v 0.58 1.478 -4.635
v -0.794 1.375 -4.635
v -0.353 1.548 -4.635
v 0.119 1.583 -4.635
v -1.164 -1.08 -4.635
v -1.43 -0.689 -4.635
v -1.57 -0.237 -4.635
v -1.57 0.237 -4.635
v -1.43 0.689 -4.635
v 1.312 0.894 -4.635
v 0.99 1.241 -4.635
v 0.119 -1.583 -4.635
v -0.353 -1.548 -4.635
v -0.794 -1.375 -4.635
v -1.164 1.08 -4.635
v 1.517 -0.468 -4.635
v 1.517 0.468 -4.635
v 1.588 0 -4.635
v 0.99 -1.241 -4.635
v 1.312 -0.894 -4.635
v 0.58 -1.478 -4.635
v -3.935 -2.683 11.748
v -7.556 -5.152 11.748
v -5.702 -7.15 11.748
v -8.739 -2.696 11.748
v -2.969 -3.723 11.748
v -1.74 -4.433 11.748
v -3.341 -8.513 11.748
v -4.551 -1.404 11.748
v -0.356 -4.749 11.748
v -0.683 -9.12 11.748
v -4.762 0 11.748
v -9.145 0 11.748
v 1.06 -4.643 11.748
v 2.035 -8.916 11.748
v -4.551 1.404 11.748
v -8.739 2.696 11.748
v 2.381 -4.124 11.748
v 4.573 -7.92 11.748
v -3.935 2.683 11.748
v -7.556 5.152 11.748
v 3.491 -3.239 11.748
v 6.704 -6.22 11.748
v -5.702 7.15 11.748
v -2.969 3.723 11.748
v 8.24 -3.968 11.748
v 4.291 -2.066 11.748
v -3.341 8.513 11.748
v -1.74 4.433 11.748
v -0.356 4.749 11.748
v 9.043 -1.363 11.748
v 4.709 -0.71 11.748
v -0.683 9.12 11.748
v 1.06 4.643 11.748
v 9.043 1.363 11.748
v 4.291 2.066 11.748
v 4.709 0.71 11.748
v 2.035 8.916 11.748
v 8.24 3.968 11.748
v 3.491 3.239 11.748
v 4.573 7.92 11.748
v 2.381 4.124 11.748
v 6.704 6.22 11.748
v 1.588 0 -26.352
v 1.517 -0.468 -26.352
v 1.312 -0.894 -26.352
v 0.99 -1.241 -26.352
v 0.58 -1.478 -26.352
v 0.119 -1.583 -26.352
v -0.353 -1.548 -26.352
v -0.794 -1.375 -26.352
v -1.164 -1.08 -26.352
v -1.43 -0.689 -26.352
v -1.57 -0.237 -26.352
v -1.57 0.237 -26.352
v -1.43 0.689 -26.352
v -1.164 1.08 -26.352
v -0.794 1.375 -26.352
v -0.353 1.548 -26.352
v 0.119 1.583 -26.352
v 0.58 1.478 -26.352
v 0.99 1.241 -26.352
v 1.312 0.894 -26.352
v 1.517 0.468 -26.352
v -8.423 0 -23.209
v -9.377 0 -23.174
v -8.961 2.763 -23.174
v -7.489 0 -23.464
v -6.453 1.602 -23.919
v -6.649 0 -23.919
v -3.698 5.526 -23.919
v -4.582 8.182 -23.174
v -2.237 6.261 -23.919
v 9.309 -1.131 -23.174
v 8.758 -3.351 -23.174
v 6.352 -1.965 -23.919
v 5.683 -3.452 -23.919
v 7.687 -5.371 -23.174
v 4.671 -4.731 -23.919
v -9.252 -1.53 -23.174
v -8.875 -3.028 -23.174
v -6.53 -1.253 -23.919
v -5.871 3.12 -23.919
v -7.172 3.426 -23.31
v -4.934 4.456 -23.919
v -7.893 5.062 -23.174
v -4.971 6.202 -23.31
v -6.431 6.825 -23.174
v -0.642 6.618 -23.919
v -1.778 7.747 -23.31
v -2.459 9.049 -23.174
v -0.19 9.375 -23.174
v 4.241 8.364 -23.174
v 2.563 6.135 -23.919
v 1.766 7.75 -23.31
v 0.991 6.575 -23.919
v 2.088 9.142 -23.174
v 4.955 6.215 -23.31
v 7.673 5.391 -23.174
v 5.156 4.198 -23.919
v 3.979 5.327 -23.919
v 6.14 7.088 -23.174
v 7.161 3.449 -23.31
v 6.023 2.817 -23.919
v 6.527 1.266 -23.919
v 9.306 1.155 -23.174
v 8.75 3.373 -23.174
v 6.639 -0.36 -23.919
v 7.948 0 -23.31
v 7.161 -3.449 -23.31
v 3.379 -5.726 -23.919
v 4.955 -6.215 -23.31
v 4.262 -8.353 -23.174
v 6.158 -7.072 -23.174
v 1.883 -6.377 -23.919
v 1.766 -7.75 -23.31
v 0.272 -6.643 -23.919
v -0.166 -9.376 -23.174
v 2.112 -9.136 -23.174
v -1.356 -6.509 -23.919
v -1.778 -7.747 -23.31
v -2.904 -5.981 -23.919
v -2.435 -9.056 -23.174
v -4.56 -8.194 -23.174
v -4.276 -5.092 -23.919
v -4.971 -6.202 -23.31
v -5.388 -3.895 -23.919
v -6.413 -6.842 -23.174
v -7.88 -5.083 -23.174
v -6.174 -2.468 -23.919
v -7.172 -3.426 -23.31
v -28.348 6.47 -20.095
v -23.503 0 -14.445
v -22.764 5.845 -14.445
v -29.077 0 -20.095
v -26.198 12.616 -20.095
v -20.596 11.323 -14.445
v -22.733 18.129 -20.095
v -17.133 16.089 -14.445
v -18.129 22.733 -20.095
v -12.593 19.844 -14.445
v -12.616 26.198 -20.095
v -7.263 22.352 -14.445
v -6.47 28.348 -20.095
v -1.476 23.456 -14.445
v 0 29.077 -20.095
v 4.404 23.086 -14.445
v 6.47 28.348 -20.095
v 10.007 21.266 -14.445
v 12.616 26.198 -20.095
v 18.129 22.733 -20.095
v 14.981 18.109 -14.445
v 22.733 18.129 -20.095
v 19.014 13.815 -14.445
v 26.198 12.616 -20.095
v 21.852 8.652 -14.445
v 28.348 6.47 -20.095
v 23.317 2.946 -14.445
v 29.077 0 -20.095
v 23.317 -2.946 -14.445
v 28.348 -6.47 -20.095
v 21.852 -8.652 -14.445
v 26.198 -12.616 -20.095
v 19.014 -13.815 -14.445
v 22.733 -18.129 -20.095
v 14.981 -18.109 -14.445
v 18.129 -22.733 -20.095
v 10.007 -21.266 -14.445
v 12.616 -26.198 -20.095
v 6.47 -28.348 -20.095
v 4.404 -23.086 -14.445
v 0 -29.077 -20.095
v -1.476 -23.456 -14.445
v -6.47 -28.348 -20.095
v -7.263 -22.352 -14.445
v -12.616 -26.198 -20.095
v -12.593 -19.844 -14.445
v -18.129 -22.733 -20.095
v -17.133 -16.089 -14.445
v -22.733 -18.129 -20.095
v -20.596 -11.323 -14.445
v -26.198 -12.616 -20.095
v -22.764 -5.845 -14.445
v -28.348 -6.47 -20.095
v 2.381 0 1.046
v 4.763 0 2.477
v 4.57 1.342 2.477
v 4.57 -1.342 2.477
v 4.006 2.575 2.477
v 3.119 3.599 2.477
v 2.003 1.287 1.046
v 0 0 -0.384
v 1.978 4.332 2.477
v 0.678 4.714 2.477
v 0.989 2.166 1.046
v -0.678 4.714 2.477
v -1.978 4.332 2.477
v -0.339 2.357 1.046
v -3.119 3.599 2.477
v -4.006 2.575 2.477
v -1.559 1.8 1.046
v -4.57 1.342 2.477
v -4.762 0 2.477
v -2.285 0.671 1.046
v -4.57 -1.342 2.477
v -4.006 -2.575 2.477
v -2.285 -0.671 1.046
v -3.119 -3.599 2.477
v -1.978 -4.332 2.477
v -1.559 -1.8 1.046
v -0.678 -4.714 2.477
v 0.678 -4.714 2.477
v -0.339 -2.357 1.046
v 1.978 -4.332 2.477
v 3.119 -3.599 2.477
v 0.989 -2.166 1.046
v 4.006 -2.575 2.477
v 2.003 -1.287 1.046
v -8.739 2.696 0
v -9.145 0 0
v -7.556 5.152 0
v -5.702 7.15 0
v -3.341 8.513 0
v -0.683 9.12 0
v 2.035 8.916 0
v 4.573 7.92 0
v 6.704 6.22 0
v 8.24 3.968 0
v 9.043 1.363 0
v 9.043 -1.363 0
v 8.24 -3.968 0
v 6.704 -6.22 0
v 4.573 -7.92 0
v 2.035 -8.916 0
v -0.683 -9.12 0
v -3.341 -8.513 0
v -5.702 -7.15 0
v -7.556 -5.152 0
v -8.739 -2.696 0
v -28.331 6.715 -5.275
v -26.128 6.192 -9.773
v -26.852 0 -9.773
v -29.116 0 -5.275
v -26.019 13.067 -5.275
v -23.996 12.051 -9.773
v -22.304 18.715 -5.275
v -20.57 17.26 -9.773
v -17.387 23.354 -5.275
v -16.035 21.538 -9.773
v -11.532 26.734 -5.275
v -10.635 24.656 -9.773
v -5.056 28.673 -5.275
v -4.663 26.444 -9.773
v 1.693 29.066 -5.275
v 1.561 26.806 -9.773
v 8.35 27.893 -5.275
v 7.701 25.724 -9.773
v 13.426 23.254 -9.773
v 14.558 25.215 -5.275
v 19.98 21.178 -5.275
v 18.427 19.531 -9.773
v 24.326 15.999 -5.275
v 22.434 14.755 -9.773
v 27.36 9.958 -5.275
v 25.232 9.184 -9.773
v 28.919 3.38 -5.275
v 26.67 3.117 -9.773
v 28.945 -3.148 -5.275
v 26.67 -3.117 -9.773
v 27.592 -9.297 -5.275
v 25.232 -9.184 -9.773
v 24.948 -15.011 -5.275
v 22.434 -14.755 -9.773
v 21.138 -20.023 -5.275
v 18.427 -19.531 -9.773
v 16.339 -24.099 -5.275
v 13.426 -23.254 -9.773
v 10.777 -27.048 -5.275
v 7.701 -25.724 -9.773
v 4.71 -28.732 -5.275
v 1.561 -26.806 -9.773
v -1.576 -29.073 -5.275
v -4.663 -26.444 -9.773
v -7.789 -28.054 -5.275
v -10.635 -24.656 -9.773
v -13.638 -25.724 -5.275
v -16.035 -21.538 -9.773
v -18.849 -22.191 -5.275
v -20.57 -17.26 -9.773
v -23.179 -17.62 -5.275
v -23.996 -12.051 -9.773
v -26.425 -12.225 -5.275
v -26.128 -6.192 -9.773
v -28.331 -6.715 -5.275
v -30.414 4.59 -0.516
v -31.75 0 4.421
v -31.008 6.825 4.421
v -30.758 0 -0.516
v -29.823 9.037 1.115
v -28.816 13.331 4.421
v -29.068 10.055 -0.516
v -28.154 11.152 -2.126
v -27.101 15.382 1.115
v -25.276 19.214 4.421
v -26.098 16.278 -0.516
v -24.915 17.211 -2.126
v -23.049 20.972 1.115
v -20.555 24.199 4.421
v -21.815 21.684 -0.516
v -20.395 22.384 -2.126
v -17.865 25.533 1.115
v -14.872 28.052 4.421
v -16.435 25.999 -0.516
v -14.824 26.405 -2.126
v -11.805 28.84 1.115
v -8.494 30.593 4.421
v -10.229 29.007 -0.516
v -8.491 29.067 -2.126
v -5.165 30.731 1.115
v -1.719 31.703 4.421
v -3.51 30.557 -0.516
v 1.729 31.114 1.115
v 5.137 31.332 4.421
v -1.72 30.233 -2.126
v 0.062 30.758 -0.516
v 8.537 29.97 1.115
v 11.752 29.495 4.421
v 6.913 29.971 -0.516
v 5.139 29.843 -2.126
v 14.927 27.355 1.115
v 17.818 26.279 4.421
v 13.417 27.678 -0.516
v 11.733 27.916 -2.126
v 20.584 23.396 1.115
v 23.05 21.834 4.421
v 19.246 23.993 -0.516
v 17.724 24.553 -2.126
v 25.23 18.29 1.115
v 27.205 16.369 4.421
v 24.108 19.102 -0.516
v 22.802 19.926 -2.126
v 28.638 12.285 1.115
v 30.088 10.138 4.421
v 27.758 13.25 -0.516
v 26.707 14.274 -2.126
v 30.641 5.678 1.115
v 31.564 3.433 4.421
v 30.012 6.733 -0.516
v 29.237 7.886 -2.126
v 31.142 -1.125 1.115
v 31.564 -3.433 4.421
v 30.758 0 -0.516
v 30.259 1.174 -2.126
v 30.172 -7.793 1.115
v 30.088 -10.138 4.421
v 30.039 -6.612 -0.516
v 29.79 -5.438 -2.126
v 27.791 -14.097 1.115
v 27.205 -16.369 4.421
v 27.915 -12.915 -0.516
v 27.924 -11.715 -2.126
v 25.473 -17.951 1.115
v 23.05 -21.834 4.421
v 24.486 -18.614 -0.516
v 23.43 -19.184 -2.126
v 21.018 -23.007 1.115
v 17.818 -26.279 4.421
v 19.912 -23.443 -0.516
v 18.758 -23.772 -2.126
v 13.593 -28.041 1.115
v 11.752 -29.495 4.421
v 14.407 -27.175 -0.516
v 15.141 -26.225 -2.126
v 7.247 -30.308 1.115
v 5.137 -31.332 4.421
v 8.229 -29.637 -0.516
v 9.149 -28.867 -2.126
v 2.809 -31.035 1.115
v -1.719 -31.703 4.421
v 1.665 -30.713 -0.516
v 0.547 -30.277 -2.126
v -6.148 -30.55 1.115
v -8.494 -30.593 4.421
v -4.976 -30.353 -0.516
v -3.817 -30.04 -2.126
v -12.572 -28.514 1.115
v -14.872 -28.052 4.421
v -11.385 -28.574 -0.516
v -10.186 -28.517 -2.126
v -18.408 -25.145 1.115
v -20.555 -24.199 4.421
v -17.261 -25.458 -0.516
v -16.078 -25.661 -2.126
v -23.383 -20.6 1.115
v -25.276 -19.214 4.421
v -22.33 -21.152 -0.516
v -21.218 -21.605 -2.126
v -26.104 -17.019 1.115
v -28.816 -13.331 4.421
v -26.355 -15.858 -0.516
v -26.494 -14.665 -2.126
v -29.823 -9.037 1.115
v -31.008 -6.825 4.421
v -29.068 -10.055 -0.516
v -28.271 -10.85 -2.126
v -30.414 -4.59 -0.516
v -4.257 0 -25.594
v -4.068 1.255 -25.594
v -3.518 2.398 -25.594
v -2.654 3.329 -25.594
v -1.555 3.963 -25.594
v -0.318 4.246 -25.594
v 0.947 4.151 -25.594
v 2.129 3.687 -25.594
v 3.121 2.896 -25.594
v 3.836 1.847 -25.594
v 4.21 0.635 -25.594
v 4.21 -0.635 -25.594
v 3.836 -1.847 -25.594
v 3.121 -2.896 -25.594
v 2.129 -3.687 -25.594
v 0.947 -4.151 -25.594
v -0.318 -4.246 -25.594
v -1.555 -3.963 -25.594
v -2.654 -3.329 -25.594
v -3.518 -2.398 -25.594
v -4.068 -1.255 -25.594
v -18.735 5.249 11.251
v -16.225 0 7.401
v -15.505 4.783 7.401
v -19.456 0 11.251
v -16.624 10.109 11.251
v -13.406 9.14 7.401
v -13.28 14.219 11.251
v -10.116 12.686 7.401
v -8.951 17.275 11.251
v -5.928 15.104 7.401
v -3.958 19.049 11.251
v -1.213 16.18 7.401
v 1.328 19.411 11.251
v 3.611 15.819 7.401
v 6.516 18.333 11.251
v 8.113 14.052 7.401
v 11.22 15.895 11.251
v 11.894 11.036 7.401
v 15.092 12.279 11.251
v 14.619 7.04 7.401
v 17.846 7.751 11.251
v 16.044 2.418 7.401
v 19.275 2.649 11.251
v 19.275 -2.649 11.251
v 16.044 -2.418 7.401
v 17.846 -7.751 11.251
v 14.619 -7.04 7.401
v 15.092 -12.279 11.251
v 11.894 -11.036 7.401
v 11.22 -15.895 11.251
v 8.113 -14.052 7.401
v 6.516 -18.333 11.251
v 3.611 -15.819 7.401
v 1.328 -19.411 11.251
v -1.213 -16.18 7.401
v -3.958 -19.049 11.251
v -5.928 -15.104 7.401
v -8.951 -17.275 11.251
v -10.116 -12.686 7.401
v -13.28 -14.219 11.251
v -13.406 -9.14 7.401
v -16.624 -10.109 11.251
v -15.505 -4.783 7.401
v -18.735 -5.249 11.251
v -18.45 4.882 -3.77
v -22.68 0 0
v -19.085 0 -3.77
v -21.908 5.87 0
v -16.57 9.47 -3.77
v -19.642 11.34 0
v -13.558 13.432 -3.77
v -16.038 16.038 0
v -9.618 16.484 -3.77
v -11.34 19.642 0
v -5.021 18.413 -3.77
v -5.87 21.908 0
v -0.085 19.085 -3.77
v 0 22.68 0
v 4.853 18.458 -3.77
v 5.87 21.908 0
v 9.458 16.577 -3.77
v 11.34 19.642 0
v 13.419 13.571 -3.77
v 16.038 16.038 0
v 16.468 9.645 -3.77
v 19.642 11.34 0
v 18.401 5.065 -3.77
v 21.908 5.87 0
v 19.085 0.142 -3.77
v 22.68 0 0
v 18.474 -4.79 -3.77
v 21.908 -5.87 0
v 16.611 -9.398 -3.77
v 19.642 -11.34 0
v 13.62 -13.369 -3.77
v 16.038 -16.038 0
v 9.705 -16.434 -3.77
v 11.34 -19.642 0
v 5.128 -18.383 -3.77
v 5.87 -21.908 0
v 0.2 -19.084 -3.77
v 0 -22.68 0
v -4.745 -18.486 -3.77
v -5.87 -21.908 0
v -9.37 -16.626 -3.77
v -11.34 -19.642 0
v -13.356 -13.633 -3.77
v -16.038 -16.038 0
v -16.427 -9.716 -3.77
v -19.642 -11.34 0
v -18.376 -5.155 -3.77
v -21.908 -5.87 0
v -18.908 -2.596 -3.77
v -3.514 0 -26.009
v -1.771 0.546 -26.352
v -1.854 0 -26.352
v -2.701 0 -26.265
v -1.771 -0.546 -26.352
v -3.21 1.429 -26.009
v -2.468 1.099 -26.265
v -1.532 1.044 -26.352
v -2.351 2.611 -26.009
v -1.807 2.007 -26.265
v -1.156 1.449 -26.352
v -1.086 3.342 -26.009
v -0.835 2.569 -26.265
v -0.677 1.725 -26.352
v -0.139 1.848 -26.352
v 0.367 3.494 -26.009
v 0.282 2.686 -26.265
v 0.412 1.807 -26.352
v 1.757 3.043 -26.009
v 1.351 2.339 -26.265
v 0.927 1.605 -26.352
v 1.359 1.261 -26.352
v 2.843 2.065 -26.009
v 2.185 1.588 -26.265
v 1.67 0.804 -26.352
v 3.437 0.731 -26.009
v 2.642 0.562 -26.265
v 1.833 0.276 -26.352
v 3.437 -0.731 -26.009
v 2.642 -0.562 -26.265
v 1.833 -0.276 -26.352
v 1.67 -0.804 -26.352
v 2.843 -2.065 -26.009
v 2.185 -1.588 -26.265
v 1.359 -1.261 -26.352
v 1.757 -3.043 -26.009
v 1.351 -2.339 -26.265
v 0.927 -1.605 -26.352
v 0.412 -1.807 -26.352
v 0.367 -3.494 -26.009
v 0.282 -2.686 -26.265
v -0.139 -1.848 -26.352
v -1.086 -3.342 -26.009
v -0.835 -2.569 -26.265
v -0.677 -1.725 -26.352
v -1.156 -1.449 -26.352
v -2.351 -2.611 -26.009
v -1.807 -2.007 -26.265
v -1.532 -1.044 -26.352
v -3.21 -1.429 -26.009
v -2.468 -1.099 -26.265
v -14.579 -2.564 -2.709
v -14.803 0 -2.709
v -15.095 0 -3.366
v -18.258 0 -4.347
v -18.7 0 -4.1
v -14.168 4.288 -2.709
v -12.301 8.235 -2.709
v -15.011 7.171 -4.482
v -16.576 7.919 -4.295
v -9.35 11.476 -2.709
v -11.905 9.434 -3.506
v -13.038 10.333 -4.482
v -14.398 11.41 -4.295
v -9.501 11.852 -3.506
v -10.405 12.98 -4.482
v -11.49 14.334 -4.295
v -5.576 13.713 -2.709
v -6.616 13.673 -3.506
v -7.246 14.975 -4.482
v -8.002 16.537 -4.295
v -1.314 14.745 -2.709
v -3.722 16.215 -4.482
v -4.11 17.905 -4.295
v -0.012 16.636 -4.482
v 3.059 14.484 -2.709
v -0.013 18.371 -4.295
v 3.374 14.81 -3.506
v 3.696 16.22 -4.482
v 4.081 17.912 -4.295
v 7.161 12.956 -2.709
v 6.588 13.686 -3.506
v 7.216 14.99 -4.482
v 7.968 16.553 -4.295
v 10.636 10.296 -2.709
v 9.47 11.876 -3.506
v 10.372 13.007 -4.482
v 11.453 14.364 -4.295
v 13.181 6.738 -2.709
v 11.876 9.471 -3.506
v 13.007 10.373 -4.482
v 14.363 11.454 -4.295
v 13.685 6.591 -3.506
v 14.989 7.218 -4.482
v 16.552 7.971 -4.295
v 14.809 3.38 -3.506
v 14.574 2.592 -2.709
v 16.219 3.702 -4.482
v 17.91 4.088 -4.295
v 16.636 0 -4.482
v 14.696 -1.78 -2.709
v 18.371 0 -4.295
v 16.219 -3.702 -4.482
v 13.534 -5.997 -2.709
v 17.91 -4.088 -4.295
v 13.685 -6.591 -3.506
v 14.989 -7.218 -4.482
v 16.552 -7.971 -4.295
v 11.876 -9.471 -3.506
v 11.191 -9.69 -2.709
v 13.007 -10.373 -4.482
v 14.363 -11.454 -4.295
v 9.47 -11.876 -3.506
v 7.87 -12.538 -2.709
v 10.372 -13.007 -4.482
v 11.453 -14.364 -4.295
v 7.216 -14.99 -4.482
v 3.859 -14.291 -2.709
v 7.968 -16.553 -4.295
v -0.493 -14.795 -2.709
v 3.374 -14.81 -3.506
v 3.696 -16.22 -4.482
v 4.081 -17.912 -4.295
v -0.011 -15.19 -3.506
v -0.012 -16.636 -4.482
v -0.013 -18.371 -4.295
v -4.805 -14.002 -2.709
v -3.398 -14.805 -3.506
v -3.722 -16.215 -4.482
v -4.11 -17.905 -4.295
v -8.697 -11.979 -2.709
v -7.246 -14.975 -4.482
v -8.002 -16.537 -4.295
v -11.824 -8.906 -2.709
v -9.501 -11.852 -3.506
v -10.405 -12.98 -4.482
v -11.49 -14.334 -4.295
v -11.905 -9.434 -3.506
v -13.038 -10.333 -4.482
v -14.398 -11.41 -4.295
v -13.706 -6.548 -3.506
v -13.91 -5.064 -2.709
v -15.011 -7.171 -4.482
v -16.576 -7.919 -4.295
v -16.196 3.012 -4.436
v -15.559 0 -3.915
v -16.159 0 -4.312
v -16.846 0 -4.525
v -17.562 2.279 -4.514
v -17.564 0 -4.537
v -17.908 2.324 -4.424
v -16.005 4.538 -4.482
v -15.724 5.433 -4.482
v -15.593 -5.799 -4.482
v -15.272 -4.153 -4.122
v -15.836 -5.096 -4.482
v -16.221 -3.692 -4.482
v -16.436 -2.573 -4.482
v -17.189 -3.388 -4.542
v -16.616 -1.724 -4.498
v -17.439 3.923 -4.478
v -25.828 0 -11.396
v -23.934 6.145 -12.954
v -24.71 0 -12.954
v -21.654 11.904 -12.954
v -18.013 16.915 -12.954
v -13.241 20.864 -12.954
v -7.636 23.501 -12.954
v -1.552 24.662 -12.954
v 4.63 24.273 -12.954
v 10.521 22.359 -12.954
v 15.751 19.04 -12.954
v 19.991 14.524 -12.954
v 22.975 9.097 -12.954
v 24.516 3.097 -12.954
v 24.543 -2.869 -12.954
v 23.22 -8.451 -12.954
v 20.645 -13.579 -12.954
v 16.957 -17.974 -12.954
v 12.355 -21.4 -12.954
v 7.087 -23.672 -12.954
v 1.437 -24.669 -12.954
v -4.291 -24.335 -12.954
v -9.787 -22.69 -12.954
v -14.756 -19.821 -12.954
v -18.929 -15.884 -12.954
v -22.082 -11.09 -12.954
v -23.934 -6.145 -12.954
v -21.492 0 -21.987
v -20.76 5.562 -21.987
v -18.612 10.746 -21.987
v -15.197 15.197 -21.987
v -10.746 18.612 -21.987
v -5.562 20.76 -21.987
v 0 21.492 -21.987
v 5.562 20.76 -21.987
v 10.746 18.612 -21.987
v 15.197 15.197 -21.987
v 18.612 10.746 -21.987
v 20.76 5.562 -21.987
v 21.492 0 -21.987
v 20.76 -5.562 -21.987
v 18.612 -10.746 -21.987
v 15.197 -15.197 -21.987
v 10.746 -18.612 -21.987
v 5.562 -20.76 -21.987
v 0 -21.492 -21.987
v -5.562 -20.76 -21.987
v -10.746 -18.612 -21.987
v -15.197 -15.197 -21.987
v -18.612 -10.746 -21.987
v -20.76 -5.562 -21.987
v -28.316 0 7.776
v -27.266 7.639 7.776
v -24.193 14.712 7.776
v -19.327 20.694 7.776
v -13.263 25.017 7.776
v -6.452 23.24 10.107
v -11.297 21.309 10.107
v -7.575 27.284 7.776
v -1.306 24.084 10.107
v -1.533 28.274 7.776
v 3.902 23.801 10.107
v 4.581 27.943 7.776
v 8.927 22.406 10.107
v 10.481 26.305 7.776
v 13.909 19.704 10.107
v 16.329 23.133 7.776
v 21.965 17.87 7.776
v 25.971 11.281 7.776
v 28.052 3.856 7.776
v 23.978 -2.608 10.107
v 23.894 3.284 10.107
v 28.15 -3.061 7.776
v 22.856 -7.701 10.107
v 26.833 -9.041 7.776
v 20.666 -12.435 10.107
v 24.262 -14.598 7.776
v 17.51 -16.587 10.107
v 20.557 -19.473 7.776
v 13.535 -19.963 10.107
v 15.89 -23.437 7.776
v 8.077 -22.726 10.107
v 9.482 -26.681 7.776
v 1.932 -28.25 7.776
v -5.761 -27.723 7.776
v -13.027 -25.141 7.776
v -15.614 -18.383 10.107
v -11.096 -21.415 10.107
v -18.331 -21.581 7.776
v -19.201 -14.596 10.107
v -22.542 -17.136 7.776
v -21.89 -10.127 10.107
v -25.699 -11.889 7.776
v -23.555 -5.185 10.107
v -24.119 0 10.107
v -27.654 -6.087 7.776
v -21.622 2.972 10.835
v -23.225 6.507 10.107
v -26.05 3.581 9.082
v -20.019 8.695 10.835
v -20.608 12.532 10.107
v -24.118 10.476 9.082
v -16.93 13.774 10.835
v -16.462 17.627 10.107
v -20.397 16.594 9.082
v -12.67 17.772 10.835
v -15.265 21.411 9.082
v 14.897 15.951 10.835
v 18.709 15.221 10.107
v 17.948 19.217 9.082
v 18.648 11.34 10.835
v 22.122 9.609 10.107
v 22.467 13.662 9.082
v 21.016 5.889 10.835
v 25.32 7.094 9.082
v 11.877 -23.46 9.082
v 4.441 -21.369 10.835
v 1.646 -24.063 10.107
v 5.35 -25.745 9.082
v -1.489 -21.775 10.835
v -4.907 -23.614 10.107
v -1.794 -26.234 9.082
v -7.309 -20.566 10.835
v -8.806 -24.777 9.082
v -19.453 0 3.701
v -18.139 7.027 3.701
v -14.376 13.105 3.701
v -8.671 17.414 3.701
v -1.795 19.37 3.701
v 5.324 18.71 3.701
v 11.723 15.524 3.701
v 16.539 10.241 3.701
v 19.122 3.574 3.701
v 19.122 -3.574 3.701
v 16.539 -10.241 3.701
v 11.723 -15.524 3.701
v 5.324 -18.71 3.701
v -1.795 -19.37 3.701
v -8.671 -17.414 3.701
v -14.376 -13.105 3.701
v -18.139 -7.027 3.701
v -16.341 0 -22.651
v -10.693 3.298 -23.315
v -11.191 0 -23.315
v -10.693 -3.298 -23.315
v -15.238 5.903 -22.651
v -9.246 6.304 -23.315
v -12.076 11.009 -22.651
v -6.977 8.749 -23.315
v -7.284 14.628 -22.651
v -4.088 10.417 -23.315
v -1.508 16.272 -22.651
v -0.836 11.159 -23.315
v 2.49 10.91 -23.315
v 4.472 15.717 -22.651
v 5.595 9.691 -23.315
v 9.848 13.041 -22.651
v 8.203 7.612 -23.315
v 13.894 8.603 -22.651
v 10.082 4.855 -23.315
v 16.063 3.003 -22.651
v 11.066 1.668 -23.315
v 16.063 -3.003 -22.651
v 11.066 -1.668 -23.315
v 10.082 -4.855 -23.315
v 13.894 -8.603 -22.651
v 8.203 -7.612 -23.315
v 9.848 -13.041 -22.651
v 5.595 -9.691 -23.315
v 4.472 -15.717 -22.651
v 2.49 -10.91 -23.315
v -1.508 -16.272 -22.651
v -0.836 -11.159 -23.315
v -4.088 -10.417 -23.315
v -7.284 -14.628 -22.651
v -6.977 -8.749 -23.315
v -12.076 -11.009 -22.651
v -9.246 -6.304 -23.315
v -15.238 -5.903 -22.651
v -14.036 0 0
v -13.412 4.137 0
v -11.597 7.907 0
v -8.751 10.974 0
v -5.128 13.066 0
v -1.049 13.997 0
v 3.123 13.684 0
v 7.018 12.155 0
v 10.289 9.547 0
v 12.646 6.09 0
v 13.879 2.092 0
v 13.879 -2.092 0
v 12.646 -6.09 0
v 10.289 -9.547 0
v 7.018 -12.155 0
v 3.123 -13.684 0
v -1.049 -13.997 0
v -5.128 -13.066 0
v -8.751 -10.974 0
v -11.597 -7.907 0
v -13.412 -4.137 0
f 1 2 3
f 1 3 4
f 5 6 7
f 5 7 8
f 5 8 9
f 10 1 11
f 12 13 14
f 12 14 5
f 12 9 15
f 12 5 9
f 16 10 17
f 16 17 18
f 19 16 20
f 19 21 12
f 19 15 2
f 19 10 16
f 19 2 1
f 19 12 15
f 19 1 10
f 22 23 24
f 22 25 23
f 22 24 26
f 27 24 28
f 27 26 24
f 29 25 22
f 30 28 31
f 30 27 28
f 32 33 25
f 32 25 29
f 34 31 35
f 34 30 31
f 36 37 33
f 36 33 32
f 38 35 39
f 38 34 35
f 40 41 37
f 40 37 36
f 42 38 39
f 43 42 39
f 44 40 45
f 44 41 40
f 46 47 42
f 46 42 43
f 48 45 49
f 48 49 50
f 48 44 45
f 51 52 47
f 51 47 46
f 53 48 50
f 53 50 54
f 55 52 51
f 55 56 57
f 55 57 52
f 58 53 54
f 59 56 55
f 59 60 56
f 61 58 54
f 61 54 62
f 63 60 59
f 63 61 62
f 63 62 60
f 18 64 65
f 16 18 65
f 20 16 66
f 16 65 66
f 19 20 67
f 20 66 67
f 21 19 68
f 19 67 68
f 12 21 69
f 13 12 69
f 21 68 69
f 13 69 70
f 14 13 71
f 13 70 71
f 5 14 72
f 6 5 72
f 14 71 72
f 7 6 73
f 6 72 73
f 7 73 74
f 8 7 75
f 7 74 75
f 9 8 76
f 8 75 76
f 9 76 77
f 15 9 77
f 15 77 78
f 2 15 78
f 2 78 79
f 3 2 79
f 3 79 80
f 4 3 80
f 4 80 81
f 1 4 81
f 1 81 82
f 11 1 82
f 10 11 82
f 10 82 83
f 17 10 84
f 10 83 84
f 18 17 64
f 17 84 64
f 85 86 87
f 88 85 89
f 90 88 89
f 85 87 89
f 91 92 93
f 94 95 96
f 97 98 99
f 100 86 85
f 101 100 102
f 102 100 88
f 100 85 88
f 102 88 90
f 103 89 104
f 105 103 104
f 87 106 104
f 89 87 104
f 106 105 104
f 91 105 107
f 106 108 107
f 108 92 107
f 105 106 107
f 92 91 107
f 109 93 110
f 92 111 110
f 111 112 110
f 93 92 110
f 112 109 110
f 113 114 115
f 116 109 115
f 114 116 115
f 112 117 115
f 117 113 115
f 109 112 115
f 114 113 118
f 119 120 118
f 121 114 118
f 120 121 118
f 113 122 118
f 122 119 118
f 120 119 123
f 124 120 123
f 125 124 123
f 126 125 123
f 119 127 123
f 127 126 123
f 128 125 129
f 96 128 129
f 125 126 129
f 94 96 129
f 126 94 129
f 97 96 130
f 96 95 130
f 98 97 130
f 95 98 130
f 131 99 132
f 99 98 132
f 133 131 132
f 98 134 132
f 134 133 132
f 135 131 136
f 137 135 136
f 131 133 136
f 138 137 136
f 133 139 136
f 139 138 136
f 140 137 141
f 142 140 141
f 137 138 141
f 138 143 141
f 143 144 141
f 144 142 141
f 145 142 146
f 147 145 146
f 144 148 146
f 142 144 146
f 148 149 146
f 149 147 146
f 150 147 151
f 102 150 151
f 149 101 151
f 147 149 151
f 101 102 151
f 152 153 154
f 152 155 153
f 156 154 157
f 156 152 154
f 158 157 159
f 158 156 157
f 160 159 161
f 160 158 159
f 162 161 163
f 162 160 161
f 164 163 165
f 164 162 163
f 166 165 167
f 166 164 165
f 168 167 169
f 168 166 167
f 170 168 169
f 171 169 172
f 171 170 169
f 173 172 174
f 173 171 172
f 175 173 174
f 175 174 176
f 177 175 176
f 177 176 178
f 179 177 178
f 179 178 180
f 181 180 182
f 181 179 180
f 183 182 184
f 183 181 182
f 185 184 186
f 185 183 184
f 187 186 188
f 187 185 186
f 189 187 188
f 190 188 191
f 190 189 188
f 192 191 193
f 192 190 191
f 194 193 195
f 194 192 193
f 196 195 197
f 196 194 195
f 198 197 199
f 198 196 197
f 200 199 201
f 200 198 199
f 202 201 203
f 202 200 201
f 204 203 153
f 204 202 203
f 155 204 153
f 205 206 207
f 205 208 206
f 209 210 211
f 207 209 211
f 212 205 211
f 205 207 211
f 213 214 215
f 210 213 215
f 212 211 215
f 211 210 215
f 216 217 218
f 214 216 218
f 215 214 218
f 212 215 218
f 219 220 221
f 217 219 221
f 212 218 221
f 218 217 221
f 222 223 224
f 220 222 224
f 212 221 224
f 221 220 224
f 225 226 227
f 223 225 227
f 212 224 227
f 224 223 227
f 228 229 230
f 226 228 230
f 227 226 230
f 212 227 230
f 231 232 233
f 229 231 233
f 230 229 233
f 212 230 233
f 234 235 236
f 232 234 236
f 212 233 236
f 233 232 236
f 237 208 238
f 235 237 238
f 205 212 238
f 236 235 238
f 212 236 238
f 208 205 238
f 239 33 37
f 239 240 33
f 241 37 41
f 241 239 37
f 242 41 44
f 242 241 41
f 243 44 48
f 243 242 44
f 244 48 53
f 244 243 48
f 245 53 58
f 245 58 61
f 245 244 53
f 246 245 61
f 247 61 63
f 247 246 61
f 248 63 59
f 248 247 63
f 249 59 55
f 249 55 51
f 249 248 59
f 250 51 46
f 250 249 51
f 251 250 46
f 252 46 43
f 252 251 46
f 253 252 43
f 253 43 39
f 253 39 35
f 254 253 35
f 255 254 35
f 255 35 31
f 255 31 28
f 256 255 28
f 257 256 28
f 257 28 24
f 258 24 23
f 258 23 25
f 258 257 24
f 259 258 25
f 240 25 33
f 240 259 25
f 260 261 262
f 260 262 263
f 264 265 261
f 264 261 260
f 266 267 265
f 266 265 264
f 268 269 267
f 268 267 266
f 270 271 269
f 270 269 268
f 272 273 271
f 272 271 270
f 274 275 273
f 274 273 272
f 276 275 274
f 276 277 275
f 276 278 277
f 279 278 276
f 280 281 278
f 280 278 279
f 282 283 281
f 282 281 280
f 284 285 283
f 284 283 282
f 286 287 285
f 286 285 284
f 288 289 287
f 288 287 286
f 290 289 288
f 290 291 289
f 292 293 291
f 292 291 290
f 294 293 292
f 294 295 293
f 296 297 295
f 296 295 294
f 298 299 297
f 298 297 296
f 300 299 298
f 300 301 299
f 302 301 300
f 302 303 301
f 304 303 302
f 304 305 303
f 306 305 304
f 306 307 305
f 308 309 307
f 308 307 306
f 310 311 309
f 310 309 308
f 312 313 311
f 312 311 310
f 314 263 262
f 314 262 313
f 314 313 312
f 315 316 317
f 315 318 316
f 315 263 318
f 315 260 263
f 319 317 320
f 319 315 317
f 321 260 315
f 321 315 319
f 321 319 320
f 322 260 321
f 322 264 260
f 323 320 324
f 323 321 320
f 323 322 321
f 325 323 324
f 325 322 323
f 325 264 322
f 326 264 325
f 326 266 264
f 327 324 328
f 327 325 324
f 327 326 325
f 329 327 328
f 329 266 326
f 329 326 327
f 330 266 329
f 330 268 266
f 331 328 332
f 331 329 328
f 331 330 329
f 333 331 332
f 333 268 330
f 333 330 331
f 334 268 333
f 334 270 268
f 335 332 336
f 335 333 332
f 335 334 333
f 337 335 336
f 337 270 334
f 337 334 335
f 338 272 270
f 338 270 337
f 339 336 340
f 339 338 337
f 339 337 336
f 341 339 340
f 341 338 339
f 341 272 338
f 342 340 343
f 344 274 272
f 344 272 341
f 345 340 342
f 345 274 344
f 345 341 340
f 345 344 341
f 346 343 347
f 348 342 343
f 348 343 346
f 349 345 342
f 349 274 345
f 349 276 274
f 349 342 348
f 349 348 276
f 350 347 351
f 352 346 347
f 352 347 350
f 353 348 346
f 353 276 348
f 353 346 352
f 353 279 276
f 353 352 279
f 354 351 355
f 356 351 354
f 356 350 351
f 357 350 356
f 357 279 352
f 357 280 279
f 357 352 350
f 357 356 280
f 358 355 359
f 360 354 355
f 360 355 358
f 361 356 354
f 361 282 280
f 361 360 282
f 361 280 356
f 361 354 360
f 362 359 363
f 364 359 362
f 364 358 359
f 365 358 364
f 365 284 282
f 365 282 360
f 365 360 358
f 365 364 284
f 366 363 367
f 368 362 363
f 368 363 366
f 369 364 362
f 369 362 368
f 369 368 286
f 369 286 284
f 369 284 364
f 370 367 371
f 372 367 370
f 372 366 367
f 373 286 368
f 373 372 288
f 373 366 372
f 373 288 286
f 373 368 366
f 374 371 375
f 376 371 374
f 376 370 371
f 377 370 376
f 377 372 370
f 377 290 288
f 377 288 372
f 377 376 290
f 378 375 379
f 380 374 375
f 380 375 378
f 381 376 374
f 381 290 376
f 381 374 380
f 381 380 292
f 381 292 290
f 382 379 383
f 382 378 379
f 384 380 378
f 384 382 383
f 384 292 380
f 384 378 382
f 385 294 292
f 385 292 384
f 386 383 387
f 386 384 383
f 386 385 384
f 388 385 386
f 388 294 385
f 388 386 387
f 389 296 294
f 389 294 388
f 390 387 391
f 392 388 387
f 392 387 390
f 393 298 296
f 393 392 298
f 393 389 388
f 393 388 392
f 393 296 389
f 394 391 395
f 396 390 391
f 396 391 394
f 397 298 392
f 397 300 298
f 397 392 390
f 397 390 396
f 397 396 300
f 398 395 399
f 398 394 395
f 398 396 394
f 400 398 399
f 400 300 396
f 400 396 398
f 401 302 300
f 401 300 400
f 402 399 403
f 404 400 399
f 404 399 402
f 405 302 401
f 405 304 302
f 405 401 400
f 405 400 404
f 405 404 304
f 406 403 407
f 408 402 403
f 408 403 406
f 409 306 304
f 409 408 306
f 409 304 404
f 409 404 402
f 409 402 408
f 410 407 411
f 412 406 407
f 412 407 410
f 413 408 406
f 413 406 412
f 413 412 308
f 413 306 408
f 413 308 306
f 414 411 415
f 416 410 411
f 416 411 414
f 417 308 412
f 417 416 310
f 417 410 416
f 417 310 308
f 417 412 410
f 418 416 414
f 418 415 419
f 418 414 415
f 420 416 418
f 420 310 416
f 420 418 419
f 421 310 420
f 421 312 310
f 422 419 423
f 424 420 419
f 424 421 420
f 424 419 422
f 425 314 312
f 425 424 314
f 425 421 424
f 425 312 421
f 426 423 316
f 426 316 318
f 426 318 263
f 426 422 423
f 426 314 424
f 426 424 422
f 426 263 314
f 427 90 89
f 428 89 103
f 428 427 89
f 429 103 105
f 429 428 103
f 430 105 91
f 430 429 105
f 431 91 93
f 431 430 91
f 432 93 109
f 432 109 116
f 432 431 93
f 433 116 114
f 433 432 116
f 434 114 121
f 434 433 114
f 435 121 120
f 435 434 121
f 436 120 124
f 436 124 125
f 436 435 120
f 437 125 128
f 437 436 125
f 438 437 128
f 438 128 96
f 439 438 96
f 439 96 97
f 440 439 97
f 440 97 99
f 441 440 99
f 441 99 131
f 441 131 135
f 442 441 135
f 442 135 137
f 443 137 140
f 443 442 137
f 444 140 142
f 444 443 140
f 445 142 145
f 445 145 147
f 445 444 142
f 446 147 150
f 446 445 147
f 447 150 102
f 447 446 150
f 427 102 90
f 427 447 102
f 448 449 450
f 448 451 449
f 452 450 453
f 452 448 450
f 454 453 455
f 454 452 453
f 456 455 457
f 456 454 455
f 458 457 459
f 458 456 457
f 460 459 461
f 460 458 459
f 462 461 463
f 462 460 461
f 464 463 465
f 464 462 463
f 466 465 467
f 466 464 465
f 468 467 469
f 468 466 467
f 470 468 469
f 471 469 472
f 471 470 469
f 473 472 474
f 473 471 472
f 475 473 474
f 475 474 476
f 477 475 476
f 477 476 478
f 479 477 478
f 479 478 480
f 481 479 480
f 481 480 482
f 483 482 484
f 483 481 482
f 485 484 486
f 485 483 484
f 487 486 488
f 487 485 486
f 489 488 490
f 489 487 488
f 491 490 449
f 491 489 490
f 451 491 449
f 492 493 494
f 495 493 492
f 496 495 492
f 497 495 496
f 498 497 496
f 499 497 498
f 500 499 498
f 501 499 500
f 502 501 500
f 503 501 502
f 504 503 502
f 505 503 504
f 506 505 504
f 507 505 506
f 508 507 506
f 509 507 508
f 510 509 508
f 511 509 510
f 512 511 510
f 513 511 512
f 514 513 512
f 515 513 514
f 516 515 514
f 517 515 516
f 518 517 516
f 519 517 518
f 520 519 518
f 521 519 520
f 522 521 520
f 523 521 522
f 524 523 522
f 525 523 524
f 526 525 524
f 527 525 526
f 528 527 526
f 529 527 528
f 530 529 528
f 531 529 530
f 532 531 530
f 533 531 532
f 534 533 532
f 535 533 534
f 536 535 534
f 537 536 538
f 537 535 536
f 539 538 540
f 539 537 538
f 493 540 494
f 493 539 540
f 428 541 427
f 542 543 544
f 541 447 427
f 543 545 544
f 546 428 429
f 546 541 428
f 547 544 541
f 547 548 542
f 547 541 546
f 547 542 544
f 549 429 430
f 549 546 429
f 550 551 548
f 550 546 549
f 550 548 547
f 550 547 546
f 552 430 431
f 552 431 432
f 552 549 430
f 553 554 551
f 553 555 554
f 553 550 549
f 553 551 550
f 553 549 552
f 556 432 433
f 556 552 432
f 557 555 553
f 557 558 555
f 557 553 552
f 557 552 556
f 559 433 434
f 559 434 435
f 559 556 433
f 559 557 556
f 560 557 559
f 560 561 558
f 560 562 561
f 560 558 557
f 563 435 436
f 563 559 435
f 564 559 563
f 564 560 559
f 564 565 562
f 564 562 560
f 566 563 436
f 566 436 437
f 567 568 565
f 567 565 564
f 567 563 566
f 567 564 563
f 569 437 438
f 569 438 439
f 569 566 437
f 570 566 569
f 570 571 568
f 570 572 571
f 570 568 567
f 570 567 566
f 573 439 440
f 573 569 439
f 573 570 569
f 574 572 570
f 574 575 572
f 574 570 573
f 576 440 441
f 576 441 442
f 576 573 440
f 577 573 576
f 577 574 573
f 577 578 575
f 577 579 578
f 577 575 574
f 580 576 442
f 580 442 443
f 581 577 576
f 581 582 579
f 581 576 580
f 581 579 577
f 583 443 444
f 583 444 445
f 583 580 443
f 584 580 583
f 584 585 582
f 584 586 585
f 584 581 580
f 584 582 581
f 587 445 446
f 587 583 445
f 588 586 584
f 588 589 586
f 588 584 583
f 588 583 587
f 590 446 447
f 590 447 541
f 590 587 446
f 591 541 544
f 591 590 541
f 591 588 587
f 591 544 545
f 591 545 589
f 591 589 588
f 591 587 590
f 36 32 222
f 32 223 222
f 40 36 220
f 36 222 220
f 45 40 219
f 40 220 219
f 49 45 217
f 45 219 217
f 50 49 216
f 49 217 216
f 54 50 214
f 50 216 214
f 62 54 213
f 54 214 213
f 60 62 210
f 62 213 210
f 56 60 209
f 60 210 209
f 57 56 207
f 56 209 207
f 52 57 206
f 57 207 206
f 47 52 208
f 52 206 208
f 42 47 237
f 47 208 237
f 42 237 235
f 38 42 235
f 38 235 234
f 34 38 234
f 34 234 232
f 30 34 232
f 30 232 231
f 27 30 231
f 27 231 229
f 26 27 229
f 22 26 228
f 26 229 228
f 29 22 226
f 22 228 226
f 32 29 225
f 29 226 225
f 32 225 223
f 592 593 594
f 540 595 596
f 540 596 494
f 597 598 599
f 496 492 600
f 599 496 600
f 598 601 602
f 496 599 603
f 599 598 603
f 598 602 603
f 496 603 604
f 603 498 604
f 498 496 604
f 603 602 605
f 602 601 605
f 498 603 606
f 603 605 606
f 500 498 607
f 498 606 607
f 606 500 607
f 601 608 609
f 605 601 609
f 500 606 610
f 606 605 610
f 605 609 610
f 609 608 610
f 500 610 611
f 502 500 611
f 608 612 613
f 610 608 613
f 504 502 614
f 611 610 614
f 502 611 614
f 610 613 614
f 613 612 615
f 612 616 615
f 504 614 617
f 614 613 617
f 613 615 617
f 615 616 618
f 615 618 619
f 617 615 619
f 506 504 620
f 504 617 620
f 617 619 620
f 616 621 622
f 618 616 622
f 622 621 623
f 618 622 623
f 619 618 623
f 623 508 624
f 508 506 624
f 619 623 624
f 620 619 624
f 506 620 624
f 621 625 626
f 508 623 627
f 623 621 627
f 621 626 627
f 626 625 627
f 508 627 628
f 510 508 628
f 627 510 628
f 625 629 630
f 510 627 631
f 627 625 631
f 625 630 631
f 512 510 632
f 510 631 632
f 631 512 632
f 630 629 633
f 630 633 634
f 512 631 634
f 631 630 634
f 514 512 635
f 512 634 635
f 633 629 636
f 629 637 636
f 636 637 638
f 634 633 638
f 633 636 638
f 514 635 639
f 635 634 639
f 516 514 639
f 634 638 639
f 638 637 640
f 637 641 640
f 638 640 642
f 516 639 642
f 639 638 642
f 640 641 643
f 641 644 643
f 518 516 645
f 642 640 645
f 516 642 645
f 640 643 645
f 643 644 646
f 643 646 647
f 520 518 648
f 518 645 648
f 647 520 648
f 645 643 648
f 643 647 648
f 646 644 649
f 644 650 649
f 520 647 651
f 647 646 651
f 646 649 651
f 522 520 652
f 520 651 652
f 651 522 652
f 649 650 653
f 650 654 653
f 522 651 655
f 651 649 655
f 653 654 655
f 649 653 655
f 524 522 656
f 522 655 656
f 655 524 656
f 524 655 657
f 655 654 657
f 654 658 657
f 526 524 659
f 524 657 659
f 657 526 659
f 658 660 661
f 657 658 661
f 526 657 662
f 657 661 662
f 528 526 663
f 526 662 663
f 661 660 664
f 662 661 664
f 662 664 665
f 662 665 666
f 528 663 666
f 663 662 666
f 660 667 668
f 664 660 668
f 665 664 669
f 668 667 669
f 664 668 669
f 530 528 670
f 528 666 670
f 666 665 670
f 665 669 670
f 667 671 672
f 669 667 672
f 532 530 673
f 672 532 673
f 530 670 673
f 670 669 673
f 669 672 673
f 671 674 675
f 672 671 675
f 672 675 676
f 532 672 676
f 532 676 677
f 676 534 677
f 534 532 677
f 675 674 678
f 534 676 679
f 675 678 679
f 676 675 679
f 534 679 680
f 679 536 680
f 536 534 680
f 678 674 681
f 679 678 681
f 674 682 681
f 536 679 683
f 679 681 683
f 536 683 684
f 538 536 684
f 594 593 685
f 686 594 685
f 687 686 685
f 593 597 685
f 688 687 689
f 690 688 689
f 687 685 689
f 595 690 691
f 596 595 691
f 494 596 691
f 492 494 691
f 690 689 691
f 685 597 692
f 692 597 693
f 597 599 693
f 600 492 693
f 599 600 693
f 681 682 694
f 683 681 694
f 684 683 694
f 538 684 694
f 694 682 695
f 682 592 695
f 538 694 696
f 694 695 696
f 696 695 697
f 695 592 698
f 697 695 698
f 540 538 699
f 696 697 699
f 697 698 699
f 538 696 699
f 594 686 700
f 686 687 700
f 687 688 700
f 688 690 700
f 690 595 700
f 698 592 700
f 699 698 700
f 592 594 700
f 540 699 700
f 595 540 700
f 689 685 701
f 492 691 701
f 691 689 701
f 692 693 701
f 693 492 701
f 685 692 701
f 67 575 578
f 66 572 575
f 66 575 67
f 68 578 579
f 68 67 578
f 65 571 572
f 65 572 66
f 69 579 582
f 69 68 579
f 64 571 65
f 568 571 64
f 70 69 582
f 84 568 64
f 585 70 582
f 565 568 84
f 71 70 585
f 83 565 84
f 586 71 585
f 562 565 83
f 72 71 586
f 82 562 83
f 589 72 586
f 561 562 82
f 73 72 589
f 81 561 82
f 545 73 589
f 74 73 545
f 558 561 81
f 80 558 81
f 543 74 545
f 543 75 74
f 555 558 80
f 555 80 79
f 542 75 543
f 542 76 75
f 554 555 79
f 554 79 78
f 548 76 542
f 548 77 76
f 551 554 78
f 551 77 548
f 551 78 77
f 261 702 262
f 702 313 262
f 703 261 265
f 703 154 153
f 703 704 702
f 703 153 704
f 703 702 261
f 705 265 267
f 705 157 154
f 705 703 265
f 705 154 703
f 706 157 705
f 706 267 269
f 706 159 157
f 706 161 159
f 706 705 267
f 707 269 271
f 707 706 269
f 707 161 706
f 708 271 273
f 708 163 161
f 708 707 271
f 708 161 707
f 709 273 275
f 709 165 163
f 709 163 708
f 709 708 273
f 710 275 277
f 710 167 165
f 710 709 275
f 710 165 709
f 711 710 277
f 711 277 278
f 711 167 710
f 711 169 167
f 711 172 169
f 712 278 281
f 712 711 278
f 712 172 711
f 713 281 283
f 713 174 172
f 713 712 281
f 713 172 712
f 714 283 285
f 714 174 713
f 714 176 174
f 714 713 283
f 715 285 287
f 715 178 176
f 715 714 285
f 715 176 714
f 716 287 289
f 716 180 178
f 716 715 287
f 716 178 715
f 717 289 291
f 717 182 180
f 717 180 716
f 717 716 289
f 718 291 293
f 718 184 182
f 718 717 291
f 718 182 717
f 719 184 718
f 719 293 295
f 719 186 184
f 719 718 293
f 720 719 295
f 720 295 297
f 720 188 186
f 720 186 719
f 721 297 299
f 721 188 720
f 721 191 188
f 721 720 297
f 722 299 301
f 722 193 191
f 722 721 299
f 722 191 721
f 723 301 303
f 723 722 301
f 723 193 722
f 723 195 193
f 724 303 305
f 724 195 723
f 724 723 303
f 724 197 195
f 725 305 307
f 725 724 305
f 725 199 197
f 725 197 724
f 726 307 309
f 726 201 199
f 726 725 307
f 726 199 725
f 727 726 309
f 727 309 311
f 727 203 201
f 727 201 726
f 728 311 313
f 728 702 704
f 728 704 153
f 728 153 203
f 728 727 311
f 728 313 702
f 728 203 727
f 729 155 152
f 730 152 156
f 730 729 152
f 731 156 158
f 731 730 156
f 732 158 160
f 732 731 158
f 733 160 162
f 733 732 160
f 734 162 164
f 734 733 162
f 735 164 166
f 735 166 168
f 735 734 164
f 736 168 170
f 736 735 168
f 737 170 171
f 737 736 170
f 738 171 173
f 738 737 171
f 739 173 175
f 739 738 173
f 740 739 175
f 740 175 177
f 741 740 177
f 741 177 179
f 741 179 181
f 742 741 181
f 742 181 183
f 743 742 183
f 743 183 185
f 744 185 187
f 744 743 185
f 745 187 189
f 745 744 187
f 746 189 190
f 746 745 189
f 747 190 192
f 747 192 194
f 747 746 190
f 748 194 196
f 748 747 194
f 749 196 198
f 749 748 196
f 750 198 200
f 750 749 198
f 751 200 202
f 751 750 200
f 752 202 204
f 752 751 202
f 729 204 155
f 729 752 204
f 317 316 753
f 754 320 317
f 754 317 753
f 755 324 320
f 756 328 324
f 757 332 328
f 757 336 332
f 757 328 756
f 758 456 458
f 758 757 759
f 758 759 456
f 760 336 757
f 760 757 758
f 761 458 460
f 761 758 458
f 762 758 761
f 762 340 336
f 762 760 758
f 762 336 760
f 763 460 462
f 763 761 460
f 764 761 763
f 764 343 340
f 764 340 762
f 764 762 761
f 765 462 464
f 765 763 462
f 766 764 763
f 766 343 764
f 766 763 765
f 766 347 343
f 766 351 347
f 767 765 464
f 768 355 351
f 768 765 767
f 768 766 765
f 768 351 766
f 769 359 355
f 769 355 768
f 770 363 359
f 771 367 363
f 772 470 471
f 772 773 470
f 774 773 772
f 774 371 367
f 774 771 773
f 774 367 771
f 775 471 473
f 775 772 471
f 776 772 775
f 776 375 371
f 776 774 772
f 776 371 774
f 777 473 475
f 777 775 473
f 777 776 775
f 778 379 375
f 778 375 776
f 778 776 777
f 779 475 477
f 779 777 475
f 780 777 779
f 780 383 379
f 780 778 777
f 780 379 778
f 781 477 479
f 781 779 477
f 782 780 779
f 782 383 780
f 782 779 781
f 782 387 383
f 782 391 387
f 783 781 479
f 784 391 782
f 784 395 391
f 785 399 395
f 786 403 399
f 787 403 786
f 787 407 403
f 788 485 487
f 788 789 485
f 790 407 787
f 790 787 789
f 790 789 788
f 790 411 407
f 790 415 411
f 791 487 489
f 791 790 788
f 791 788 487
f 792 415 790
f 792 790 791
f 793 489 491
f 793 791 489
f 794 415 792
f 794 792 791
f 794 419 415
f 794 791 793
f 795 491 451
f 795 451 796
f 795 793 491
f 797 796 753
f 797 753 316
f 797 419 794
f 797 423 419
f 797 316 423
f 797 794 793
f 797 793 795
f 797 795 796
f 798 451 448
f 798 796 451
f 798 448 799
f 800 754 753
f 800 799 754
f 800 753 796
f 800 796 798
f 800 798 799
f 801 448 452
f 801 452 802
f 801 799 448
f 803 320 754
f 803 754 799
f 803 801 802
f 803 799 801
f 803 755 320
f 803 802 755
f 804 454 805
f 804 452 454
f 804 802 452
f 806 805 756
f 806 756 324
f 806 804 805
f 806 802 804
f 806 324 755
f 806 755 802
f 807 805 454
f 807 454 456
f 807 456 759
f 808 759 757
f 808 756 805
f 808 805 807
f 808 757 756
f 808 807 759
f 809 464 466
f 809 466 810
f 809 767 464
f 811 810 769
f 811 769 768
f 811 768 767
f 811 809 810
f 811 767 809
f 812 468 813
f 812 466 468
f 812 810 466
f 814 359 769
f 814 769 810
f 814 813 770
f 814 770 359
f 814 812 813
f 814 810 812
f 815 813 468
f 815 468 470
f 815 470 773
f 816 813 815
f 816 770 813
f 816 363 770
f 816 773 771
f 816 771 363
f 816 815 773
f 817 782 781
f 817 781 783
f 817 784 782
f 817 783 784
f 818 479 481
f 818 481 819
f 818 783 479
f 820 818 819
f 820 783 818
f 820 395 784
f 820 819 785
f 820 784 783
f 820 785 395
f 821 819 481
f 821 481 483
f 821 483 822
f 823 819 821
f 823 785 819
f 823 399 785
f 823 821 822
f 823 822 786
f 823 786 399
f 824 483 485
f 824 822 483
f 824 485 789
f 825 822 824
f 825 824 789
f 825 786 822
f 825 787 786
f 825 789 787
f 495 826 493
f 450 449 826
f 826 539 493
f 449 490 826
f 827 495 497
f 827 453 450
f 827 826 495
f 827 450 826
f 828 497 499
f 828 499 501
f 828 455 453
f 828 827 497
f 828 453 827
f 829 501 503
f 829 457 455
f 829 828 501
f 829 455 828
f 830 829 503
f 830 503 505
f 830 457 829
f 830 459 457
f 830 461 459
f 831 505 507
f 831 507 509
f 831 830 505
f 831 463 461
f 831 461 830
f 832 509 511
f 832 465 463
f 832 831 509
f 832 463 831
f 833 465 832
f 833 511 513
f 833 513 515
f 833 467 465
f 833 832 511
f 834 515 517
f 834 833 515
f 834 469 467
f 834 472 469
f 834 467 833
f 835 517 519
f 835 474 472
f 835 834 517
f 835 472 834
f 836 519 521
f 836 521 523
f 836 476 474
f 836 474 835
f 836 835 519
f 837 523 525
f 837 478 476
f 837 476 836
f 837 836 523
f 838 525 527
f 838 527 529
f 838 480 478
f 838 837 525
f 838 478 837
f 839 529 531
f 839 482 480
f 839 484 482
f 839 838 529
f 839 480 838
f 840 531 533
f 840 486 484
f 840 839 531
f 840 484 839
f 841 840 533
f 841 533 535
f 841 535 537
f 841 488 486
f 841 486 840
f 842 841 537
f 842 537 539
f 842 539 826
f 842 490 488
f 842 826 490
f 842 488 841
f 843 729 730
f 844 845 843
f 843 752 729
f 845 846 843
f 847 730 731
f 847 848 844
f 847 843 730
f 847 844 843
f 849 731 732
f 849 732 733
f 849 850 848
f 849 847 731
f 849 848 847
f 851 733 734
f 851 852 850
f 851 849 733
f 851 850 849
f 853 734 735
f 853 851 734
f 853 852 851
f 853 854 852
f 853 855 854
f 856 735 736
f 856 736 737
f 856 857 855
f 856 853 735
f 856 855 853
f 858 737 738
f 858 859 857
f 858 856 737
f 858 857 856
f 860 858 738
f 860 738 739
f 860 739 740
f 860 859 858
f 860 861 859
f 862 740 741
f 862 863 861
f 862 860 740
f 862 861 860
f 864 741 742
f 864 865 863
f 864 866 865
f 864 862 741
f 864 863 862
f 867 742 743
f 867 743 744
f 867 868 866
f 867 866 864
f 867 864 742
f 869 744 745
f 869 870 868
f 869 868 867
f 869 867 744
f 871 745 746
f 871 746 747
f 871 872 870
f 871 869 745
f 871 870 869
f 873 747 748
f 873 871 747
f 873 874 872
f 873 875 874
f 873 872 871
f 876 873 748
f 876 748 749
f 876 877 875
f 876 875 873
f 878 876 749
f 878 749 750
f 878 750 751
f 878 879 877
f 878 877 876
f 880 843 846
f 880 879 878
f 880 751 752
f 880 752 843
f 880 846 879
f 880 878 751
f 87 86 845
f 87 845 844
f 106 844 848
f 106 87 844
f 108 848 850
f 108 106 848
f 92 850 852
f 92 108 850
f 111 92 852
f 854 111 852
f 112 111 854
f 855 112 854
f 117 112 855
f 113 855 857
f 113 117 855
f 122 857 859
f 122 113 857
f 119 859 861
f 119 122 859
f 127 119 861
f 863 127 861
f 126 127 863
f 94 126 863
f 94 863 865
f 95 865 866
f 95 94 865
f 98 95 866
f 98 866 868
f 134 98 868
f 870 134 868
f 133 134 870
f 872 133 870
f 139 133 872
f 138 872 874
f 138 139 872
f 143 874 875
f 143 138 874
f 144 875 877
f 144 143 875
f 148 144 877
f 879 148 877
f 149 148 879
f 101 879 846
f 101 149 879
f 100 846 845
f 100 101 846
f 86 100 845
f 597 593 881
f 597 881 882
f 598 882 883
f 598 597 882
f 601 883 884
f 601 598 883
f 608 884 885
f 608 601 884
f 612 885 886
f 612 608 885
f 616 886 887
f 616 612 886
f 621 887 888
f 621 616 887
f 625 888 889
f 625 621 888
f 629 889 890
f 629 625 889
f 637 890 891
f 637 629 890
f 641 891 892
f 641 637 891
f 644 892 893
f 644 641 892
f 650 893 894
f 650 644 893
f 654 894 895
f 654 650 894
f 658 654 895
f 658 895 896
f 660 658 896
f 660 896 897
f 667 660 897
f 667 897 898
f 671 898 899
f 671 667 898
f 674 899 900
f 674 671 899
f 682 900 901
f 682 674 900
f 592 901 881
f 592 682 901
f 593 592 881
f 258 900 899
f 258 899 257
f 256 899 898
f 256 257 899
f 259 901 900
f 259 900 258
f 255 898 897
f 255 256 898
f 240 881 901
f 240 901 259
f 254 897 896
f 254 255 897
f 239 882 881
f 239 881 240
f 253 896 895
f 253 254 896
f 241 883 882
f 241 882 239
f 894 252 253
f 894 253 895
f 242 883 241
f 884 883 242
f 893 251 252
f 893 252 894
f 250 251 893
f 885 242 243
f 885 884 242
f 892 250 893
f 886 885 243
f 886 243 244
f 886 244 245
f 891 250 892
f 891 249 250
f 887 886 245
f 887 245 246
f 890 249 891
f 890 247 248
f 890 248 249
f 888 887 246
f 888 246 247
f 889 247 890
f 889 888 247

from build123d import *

# Parameters (mm, degrees)
F3_D     = 9.525
F3_DEPTH = 9.271
F3_TIP   = 2.8615986981
F4_R     = 1.5875
F5_DEPTH = 21.717
F6_R     = 2.54
F7_R     = 4.191


with BuildPart() as f1:
    # F0 (on Front) → F1 (revolve)
    with BuildSketch(Plane.XZ):
        with BuildLine():
            Line((0, -26.3518410662), (0, 0))
            Line((0, 0), (0, 11.7481589338))
            Line((0, 11.7481589338), (-9.1452337801, 11.7481589338))
            Line((-9.1452337801, 11.7481589338), (-9.1452337801, 0))
            Line((-9.1452337801, 0), (-14.0358982608, 0))
            Line((-14.0358982608, 0), (-16.0151850432, -6.9885868579))
            Line((-16.0151850432, -6.9885868579), (-22.680465132, 0))
            Line((-22.680465132, 0), (-16.2254925817, 7.4013243429))
            Line((-16.2254925817, 7.4013243429), (-19.4562915713, 11.250785552))
            ThreePointArc((-19.4562915713, 11.250785552), (-26.295058761, 9.081502601), (-31.75, 4.4212299399))
            ThreePointArc((-31.75, 4.4212299399), (-30.0167425827, -2.9230382279), (-26.851716639, -9.7732255955))
            ThreePointArc((-26.851716639, -9.7732255955), (-25.2807815933, -12.1832568025), (-23.5026830704, -14.4447724402))
            Line((-23.5026830704, -14.4447724402), (-29.0771815926, -20.0948305428))
            Line((-29.0771815926, -20.0948305428), (-21.4918367565, -21.9874773175))
            Line((-21.4918367565, -21.9874773175), (-11.1905843171, -23.3150029238))
            Line((-11.1905843171, -23.3150029238), (-7.8794877043, -23.0577233122))
            Line((-7.8794877043, -23.0577233122), (-3.175, -26.3518410662))
            Line((-3.175, -26.3518410662), (0, -26.3518410662))
        make_face()
    revolve(axis=Axis((0, 0, 5.8740794669), (0, 0, -1)))

    # F3
    with Locations(Plane.XY.offset(11.7481589338)):
        with Locations((0, 0)):
            Hole(F3_D / 2, depth=F3_DEPTH)
            with Locations((0, 0, -(F3_DEPTH + F3_TIP / 2))):  # 118° drill point
                Cone(0, F3_D / 2, F3_TIP, mode=Mode.SUBTRACT)

    # F4 (on face) → F5 (cut)
    with BuildSketch(Plane(origin=(0, 0, -26.3518410662), x_dir=(1, 0, 0), z_dir=(0, 0, -1))):
        Circle(F4_R)
    extrude(amount=-F5_DEPTH, mode=Mode.SUBTRACT)

    # F6
    f6_edges = [f1.edges().sort_by_distance(p)[0] for p in [
        (16.015185, 0, -6.988587),
    ]]
    fillet(f6_edges, radius=F6_R)

    # F7
    f7_edges = [f1.edges().sort_by_distance(p)[0] for p in [
        (7.879488, 0, -23.057723),
        (3.175, 0, -26.351841),
    ]]
    fillet(f7_edges, radius=F7_R)


solid = f1.part
